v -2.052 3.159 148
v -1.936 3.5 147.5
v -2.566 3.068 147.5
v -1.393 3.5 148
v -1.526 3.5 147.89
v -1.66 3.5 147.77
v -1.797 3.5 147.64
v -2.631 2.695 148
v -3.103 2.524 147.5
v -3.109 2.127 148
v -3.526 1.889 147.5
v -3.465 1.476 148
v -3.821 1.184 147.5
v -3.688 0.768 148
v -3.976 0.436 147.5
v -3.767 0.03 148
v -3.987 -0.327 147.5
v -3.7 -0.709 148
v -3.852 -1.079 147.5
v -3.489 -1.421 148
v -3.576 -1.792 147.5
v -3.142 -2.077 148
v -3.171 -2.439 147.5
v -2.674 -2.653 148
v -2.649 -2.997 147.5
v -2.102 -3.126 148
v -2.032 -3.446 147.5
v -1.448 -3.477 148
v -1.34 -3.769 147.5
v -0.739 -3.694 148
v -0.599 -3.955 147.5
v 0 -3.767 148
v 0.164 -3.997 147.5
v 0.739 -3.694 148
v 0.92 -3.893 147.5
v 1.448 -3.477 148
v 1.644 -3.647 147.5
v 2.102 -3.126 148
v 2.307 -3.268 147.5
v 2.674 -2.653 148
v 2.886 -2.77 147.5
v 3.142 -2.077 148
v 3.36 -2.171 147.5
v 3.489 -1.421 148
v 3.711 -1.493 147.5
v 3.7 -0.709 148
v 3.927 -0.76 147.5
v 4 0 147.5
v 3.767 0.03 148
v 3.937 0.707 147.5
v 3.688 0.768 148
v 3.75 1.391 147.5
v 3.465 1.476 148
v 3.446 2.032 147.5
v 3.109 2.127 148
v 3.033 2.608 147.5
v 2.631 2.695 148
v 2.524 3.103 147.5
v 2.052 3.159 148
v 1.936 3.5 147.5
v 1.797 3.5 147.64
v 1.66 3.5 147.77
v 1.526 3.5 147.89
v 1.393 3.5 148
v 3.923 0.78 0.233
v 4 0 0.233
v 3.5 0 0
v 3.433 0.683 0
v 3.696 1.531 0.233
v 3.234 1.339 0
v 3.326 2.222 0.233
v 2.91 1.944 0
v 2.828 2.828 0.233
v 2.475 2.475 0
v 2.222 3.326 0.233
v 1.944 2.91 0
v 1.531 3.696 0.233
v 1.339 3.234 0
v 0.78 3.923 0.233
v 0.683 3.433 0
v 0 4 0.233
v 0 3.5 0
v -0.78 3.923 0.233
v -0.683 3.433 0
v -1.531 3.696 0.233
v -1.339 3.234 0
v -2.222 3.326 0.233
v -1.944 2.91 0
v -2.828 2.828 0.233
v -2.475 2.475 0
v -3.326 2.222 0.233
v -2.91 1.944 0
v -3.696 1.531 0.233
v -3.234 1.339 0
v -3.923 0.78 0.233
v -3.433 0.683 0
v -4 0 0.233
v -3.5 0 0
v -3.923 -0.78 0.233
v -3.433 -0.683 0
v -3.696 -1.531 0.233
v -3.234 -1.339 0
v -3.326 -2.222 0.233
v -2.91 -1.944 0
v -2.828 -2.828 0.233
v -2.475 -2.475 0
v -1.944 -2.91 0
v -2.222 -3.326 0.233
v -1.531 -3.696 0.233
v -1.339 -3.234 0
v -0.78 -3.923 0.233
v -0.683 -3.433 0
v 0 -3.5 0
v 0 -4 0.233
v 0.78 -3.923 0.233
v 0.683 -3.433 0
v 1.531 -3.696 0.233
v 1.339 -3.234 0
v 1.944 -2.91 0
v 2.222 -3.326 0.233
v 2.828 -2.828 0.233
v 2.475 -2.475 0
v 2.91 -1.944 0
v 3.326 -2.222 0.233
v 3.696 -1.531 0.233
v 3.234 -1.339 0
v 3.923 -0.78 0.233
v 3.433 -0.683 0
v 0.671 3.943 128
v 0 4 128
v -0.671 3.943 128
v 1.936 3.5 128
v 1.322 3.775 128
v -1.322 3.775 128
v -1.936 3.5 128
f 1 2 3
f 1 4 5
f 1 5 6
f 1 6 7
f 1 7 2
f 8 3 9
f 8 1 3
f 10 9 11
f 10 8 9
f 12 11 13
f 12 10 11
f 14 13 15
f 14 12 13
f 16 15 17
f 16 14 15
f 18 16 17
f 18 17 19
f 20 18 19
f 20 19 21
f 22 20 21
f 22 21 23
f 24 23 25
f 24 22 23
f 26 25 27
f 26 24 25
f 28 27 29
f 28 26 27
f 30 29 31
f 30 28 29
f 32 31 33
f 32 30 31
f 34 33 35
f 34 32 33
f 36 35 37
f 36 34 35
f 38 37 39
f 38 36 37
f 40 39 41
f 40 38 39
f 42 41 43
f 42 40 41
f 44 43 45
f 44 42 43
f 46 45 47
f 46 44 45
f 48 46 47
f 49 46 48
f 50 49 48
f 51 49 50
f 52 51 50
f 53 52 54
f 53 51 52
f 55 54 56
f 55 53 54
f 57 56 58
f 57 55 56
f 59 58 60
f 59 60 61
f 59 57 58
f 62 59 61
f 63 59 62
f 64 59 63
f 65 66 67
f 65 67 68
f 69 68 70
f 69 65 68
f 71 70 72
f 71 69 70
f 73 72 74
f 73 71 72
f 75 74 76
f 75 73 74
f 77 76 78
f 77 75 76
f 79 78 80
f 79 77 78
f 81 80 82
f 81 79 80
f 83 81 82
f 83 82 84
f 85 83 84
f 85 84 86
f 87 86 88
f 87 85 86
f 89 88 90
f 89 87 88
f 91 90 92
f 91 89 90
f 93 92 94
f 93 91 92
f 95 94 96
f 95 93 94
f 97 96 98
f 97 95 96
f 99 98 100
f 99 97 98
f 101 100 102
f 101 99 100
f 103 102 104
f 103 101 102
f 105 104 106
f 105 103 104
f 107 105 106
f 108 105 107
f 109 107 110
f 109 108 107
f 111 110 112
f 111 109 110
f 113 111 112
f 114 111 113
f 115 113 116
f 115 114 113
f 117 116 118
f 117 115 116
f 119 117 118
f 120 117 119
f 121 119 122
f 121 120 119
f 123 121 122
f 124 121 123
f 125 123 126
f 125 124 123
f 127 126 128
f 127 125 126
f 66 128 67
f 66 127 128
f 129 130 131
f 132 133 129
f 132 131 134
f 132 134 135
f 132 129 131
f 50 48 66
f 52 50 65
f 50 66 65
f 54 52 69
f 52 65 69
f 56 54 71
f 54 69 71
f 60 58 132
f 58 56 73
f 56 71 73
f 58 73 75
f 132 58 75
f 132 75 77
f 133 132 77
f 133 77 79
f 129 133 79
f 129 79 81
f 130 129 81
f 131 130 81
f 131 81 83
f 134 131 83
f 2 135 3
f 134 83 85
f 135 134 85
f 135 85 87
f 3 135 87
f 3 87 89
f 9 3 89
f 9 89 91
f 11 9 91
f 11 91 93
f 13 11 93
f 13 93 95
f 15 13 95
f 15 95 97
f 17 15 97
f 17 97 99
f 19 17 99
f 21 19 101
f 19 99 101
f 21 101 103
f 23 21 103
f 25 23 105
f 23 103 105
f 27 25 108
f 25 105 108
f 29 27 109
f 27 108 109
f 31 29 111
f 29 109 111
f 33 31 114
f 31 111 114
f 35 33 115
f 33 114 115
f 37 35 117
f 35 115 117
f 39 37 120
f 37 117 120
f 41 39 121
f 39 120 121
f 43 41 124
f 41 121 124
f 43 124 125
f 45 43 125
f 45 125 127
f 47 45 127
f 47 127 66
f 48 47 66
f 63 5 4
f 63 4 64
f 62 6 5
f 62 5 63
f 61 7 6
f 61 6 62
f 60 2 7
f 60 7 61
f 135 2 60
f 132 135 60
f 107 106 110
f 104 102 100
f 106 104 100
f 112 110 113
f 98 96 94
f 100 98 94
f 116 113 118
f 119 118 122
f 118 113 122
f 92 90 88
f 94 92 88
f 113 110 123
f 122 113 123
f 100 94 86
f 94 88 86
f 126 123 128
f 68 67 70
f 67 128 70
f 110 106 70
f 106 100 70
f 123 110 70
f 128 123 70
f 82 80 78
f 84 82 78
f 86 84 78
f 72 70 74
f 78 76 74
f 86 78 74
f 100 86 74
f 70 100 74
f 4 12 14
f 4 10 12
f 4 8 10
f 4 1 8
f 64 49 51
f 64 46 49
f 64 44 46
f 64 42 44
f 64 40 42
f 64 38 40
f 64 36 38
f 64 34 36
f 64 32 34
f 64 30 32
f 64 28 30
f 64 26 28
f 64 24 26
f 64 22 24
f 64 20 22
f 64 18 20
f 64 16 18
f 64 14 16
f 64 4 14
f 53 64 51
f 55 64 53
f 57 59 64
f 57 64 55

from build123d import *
from OCP.BRepFilletAPI import BRepFilletAPI_MakeChamfer

# Parameters (mm, degrees)
SKICA1_R                 = 4
P_IDAT_VYSUNUT_M1_DEPTH  = 148
ZKOSEN_1_SIZE            = 0.5
ZKOSEN_1_SIZE2           = 0.233153829
ODEBRAT_START            = -20
ODEBRAT_VYSUNUT_M1_DEPTH = 20


with BuildPart() as part:
    # Skica1 → Přidat vysunutím1 (new body)
    with BuildSketch(Plane.XY):
        Circle(SKICA1_R)
    extrude(amount=P_IDAT_VYSUNUT_M1_DEPTH)

    # Zkosení1: one chamfer whose edges measure the first distance from different faces: ONE call of the kernel's chamfer builder (chamfer() names one face for all edges)
    zkosen_1_edges_1 = [part.edges().sort_by_distance(p)[0] for p in [
        (-4, 0, 0),
    ]]
    zkosen_1_side_1 = [part.faces().sort_by_distance(p)[0] for p in [
        (0, 0, 0),
    ]]
    zkosen_1_edges_2 = [part.edges().sort_by_distance(p)[0] for p in [
        (-4, 0, 148),
    ]]
    zkosen_1_side_2 = [part.faces().sort_by_distance(p)[0] for p in [
        (-4, 0, 74),
    ]]
    zkosen_1 = BRepFilletAPI_MakeChamfer(part.part.solid().wrapped)
    for e in zkosen_1_edges_1:
        zkosen_1.Add(ZKOSEN_1_SIZE, ZKOSEN_1_SIZE2, e.wrapped, zkosen_1_side_1[0].wrapped)  # the first distance lies on this face
    for e in zkosen_1_edges_2:
        zkosen_1.Add(ZKOSEN_1_SIZE, ZKOSEN_1_SIZE2, e.wrapped, zkosen_1_side_2[0].wrapped)  # the first distance lies on this face
    add(Compound.cast(zkosen_1.Shape()), mode=Mode.REPLACE)

    # Skica2 → Odebrat vysunutím1 (cut)
    with BuildSketch(Plane.XY.offset(148).offset(ODEBRAT_START)):
        with BuildLine():
            Line((-1.936491673, 3.5), (1.936491673, 3.5))
            ThreePointArc((1.936491673, 3.5), (0, 4), (-1.936491673, 3.5))
        make_face()
    extrude(amount=ODEBRAT_VYSUNUT_M1_DEPTH, mode=Mode.SUBTRACT)


solid = part.part
